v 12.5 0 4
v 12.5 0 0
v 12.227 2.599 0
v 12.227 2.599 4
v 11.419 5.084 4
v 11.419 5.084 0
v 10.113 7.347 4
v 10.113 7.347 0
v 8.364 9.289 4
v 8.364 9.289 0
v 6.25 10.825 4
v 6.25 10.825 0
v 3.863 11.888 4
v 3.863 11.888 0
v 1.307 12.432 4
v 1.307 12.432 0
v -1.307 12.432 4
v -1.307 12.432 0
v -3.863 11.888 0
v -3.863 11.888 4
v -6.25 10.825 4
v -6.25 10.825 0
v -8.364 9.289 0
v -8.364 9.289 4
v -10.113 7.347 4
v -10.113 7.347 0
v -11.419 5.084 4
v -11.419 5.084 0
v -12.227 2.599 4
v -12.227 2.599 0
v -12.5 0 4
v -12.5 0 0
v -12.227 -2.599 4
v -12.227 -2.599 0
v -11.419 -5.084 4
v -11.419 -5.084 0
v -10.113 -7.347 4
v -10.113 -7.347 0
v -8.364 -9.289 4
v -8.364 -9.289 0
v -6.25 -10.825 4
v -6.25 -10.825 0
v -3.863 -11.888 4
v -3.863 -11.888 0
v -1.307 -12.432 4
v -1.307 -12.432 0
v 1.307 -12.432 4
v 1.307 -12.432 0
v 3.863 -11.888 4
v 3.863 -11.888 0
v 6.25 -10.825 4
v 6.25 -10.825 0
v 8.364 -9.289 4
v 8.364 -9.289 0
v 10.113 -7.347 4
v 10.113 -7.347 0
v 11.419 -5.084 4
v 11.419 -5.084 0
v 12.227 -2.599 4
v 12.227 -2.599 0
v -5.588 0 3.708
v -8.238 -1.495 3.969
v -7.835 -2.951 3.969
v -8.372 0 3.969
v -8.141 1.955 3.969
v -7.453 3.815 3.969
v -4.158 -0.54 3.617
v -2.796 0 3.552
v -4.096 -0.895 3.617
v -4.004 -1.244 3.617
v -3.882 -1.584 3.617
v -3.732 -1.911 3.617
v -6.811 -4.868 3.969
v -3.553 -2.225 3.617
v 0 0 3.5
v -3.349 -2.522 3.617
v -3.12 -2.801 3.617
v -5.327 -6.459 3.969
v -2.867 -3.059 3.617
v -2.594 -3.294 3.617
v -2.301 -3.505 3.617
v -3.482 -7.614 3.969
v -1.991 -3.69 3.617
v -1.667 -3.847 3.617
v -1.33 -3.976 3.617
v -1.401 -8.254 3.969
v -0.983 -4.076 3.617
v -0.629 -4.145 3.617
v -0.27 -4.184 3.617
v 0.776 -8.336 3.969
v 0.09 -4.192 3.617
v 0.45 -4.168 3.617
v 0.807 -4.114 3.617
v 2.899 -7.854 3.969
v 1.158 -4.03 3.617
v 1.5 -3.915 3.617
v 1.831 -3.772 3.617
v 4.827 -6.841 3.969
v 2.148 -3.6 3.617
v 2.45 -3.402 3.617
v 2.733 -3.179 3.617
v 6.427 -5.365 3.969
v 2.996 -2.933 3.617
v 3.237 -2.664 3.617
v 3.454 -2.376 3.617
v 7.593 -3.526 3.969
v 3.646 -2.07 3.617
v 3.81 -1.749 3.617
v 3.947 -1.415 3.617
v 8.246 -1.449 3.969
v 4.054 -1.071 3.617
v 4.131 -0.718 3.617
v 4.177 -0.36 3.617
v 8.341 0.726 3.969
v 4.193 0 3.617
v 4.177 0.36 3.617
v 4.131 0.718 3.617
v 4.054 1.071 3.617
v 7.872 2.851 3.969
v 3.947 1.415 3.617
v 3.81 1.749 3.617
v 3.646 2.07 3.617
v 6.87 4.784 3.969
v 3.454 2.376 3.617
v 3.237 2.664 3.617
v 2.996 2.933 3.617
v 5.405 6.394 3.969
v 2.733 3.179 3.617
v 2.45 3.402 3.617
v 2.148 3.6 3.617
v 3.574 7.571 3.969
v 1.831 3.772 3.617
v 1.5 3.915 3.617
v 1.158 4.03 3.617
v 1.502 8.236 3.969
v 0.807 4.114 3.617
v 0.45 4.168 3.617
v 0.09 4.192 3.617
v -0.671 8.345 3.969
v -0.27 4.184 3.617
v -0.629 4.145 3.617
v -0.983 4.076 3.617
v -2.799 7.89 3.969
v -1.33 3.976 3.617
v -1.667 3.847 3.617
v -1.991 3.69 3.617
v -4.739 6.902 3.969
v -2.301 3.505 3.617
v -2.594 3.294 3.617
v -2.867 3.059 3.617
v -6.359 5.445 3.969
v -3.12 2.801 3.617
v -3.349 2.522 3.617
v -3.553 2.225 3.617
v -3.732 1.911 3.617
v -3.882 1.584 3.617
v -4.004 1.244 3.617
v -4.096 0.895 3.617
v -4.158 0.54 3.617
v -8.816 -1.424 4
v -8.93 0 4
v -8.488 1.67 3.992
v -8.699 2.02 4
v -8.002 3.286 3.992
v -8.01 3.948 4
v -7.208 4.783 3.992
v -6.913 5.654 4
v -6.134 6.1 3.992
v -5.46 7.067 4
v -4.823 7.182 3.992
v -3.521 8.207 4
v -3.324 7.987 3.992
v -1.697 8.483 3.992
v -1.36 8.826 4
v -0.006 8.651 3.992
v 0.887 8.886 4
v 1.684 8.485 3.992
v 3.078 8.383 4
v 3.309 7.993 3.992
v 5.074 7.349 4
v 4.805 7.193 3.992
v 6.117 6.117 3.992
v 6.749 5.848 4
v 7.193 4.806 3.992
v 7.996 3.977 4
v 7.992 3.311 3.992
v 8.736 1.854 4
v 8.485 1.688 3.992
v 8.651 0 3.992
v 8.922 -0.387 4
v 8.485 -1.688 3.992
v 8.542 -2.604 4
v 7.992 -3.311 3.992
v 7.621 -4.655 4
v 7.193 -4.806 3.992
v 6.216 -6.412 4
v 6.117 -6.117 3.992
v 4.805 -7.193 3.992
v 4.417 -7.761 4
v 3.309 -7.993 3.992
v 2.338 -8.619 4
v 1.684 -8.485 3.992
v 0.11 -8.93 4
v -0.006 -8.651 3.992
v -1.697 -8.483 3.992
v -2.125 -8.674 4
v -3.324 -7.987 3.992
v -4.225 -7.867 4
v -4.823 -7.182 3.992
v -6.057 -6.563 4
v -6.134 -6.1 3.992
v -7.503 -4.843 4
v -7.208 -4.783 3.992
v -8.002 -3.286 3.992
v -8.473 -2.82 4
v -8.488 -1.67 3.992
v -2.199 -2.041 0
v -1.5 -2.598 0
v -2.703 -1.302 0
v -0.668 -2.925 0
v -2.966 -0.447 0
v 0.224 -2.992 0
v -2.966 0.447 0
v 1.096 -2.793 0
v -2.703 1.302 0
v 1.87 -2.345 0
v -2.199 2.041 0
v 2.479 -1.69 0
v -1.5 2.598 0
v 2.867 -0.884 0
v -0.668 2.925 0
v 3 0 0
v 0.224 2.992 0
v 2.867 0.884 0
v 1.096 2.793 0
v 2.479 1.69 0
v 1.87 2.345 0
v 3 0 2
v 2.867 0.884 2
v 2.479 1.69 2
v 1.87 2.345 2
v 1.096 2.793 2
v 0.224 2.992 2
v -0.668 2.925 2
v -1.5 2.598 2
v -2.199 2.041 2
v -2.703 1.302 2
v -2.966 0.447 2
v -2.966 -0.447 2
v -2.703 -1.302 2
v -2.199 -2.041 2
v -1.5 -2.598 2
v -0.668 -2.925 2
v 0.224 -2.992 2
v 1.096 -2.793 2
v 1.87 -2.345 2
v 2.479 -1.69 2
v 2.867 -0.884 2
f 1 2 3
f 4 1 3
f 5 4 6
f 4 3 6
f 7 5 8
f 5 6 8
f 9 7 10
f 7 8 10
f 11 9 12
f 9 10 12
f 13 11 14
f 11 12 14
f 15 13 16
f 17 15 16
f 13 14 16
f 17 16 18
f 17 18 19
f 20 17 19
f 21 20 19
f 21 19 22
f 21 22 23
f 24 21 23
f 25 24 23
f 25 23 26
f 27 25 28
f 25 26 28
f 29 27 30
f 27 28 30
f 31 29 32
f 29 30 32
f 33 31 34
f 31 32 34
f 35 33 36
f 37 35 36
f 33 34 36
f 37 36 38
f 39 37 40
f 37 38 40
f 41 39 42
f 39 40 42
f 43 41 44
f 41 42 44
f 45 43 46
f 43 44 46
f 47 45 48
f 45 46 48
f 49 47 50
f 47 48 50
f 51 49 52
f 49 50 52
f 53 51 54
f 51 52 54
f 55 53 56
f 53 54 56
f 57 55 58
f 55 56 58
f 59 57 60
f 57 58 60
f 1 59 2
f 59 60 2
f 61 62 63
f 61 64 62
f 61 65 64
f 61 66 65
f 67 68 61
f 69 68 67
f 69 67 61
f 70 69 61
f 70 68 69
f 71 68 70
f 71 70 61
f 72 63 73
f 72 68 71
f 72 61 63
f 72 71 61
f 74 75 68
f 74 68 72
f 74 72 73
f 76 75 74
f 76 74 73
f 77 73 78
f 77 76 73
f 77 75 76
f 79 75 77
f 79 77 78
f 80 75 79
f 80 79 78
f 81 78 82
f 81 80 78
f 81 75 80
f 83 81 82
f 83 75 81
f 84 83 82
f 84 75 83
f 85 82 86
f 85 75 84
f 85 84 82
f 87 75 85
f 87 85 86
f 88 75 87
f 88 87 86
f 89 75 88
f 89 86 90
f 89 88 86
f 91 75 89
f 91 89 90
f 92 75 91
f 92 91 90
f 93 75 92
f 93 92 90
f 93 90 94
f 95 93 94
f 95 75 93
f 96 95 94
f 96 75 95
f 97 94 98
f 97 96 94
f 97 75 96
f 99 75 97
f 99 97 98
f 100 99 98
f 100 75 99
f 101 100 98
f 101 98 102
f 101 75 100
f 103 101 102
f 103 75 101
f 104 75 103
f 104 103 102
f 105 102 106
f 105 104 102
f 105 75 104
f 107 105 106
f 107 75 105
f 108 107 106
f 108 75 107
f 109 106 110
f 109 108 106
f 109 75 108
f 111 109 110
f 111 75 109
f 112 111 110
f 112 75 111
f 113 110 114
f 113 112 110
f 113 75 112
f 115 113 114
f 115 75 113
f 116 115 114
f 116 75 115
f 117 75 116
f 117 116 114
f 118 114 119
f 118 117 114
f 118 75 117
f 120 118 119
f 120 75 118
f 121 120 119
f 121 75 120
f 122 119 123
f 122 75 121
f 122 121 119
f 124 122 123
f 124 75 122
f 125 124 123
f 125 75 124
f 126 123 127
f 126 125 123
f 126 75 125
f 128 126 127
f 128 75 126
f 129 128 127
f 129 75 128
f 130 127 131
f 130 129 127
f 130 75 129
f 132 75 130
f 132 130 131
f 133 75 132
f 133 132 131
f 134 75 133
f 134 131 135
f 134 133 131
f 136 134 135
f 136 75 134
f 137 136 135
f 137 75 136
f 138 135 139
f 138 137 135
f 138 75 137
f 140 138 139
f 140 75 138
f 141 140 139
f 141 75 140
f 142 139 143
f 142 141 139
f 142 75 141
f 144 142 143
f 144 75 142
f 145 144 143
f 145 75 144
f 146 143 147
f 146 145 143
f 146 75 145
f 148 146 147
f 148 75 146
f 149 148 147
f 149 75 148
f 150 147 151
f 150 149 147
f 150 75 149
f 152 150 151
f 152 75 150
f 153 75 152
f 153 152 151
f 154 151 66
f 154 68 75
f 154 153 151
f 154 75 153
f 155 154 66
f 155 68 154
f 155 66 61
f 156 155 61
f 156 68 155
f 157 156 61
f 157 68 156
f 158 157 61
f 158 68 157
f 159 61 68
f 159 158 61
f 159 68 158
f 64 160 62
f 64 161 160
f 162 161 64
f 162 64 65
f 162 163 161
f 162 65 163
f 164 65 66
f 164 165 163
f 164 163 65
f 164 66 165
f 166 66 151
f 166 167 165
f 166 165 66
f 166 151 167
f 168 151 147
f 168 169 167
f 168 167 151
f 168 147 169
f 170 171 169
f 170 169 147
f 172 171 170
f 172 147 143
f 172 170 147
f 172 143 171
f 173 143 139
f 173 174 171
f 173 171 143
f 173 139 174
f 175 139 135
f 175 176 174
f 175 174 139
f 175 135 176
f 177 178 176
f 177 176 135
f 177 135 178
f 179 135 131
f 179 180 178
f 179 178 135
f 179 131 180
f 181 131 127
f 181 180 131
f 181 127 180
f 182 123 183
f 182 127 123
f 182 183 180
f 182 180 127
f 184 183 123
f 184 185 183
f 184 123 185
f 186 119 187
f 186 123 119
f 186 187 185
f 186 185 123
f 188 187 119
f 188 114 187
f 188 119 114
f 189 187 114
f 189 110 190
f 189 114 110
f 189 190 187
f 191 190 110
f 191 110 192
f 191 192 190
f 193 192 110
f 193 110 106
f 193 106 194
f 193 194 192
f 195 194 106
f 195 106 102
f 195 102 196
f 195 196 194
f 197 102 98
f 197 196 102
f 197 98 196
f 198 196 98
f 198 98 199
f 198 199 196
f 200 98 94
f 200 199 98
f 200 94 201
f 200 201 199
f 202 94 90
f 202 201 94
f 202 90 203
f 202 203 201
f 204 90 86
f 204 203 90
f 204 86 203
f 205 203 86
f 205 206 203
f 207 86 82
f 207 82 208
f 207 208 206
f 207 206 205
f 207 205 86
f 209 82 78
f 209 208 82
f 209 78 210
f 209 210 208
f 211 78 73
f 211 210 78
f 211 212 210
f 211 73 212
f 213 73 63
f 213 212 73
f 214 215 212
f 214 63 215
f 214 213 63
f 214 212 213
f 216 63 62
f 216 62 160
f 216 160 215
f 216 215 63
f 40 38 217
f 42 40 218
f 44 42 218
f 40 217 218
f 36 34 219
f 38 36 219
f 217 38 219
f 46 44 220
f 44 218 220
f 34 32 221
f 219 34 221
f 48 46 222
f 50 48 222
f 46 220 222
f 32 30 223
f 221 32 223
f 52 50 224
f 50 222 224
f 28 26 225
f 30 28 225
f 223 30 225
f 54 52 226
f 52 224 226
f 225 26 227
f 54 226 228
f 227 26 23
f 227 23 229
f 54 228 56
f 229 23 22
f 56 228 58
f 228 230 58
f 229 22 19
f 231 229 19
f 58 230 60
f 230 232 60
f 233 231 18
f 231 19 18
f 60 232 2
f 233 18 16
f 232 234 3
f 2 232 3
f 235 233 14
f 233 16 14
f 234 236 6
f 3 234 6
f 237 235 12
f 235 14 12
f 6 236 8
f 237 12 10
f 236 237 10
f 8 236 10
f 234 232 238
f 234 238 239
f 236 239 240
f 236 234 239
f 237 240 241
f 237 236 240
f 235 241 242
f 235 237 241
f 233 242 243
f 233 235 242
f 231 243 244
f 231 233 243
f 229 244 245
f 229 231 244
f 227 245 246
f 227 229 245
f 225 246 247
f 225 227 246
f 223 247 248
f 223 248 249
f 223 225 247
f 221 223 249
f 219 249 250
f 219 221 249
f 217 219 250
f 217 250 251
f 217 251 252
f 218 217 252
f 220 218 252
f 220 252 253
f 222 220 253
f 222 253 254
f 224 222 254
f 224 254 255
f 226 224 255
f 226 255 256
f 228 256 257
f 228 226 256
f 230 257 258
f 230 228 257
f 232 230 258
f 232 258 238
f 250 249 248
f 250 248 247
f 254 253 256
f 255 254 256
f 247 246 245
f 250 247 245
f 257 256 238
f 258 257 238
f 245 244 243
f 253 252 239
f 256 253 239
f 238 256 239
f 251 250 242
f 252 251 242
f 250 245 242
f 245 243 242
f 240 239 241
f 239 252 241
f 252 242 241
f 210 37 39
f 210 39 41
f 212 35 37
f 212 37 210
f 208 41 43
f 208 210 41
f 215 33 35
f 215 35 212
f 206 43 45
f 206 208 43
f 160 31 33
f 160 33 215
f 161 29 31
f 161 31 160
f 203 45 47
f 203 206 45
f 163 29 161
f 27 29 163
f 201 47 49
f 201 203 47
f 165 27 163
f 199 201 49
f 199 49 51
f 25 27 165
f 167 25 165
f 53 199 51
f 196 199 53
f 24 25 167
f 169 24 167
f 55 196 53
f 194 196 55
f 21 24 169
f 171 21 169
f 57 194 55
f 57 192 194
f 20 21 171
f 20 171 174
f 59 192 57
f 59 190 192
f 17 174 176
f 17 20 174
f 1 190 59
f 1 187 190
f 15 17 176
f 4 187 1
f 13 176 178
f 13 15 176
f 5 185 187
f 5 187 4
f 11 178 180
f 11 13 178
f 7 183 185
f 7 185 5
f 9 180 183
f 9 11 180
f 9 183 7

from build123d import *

# Parameters (mm, degrees)
F0_R     = 12.5
F0_R_2   = 3
F1_DEPTH = 4
F2_DEPTH = 2
F5_R     = 5


with BuildPart() as f1:
    # F0 (on Top) → F1 (new body)
    with BuildSketch(Plane.XY):
        Circle(F0_R)
        Circle(F0_R_2, mode=Mode.SUBTRACT)
        Circle(F0_R_2)
    extrude(amount=F1_DEPTH)

    # F0 (on Top) → F2 (cut)
    with BuildSketch(Plane.XY):
        Circle(F0_R_2)
    extrude(amount=F2_DEPTH, mode=Mode.SUBTRACT)

    # F3 (on Front) → F4 (revolve, cut)
    with BuildSketch(Plane.XZ):
        with BuildLine():
            ThreePointArc((0, 153.5), (-75, 78.5), (0, 3.5))
            Line((0, 3.5), (0, 4))
            Line((0, 4), (0, 153.5))
        make_face()
    revolve(axis=Axis((0, 0, 82.6326791644), (0, 0, 1)), mode=Mode.SUBTRACT)

    # F5
    f5_edges = [f1.edges().sort_by_distance(p)[0] for p in [
        (8.645808, 0, 4),
    ]]
    fillet(f5_edges, radius=F5_R)


solid = f1.part
